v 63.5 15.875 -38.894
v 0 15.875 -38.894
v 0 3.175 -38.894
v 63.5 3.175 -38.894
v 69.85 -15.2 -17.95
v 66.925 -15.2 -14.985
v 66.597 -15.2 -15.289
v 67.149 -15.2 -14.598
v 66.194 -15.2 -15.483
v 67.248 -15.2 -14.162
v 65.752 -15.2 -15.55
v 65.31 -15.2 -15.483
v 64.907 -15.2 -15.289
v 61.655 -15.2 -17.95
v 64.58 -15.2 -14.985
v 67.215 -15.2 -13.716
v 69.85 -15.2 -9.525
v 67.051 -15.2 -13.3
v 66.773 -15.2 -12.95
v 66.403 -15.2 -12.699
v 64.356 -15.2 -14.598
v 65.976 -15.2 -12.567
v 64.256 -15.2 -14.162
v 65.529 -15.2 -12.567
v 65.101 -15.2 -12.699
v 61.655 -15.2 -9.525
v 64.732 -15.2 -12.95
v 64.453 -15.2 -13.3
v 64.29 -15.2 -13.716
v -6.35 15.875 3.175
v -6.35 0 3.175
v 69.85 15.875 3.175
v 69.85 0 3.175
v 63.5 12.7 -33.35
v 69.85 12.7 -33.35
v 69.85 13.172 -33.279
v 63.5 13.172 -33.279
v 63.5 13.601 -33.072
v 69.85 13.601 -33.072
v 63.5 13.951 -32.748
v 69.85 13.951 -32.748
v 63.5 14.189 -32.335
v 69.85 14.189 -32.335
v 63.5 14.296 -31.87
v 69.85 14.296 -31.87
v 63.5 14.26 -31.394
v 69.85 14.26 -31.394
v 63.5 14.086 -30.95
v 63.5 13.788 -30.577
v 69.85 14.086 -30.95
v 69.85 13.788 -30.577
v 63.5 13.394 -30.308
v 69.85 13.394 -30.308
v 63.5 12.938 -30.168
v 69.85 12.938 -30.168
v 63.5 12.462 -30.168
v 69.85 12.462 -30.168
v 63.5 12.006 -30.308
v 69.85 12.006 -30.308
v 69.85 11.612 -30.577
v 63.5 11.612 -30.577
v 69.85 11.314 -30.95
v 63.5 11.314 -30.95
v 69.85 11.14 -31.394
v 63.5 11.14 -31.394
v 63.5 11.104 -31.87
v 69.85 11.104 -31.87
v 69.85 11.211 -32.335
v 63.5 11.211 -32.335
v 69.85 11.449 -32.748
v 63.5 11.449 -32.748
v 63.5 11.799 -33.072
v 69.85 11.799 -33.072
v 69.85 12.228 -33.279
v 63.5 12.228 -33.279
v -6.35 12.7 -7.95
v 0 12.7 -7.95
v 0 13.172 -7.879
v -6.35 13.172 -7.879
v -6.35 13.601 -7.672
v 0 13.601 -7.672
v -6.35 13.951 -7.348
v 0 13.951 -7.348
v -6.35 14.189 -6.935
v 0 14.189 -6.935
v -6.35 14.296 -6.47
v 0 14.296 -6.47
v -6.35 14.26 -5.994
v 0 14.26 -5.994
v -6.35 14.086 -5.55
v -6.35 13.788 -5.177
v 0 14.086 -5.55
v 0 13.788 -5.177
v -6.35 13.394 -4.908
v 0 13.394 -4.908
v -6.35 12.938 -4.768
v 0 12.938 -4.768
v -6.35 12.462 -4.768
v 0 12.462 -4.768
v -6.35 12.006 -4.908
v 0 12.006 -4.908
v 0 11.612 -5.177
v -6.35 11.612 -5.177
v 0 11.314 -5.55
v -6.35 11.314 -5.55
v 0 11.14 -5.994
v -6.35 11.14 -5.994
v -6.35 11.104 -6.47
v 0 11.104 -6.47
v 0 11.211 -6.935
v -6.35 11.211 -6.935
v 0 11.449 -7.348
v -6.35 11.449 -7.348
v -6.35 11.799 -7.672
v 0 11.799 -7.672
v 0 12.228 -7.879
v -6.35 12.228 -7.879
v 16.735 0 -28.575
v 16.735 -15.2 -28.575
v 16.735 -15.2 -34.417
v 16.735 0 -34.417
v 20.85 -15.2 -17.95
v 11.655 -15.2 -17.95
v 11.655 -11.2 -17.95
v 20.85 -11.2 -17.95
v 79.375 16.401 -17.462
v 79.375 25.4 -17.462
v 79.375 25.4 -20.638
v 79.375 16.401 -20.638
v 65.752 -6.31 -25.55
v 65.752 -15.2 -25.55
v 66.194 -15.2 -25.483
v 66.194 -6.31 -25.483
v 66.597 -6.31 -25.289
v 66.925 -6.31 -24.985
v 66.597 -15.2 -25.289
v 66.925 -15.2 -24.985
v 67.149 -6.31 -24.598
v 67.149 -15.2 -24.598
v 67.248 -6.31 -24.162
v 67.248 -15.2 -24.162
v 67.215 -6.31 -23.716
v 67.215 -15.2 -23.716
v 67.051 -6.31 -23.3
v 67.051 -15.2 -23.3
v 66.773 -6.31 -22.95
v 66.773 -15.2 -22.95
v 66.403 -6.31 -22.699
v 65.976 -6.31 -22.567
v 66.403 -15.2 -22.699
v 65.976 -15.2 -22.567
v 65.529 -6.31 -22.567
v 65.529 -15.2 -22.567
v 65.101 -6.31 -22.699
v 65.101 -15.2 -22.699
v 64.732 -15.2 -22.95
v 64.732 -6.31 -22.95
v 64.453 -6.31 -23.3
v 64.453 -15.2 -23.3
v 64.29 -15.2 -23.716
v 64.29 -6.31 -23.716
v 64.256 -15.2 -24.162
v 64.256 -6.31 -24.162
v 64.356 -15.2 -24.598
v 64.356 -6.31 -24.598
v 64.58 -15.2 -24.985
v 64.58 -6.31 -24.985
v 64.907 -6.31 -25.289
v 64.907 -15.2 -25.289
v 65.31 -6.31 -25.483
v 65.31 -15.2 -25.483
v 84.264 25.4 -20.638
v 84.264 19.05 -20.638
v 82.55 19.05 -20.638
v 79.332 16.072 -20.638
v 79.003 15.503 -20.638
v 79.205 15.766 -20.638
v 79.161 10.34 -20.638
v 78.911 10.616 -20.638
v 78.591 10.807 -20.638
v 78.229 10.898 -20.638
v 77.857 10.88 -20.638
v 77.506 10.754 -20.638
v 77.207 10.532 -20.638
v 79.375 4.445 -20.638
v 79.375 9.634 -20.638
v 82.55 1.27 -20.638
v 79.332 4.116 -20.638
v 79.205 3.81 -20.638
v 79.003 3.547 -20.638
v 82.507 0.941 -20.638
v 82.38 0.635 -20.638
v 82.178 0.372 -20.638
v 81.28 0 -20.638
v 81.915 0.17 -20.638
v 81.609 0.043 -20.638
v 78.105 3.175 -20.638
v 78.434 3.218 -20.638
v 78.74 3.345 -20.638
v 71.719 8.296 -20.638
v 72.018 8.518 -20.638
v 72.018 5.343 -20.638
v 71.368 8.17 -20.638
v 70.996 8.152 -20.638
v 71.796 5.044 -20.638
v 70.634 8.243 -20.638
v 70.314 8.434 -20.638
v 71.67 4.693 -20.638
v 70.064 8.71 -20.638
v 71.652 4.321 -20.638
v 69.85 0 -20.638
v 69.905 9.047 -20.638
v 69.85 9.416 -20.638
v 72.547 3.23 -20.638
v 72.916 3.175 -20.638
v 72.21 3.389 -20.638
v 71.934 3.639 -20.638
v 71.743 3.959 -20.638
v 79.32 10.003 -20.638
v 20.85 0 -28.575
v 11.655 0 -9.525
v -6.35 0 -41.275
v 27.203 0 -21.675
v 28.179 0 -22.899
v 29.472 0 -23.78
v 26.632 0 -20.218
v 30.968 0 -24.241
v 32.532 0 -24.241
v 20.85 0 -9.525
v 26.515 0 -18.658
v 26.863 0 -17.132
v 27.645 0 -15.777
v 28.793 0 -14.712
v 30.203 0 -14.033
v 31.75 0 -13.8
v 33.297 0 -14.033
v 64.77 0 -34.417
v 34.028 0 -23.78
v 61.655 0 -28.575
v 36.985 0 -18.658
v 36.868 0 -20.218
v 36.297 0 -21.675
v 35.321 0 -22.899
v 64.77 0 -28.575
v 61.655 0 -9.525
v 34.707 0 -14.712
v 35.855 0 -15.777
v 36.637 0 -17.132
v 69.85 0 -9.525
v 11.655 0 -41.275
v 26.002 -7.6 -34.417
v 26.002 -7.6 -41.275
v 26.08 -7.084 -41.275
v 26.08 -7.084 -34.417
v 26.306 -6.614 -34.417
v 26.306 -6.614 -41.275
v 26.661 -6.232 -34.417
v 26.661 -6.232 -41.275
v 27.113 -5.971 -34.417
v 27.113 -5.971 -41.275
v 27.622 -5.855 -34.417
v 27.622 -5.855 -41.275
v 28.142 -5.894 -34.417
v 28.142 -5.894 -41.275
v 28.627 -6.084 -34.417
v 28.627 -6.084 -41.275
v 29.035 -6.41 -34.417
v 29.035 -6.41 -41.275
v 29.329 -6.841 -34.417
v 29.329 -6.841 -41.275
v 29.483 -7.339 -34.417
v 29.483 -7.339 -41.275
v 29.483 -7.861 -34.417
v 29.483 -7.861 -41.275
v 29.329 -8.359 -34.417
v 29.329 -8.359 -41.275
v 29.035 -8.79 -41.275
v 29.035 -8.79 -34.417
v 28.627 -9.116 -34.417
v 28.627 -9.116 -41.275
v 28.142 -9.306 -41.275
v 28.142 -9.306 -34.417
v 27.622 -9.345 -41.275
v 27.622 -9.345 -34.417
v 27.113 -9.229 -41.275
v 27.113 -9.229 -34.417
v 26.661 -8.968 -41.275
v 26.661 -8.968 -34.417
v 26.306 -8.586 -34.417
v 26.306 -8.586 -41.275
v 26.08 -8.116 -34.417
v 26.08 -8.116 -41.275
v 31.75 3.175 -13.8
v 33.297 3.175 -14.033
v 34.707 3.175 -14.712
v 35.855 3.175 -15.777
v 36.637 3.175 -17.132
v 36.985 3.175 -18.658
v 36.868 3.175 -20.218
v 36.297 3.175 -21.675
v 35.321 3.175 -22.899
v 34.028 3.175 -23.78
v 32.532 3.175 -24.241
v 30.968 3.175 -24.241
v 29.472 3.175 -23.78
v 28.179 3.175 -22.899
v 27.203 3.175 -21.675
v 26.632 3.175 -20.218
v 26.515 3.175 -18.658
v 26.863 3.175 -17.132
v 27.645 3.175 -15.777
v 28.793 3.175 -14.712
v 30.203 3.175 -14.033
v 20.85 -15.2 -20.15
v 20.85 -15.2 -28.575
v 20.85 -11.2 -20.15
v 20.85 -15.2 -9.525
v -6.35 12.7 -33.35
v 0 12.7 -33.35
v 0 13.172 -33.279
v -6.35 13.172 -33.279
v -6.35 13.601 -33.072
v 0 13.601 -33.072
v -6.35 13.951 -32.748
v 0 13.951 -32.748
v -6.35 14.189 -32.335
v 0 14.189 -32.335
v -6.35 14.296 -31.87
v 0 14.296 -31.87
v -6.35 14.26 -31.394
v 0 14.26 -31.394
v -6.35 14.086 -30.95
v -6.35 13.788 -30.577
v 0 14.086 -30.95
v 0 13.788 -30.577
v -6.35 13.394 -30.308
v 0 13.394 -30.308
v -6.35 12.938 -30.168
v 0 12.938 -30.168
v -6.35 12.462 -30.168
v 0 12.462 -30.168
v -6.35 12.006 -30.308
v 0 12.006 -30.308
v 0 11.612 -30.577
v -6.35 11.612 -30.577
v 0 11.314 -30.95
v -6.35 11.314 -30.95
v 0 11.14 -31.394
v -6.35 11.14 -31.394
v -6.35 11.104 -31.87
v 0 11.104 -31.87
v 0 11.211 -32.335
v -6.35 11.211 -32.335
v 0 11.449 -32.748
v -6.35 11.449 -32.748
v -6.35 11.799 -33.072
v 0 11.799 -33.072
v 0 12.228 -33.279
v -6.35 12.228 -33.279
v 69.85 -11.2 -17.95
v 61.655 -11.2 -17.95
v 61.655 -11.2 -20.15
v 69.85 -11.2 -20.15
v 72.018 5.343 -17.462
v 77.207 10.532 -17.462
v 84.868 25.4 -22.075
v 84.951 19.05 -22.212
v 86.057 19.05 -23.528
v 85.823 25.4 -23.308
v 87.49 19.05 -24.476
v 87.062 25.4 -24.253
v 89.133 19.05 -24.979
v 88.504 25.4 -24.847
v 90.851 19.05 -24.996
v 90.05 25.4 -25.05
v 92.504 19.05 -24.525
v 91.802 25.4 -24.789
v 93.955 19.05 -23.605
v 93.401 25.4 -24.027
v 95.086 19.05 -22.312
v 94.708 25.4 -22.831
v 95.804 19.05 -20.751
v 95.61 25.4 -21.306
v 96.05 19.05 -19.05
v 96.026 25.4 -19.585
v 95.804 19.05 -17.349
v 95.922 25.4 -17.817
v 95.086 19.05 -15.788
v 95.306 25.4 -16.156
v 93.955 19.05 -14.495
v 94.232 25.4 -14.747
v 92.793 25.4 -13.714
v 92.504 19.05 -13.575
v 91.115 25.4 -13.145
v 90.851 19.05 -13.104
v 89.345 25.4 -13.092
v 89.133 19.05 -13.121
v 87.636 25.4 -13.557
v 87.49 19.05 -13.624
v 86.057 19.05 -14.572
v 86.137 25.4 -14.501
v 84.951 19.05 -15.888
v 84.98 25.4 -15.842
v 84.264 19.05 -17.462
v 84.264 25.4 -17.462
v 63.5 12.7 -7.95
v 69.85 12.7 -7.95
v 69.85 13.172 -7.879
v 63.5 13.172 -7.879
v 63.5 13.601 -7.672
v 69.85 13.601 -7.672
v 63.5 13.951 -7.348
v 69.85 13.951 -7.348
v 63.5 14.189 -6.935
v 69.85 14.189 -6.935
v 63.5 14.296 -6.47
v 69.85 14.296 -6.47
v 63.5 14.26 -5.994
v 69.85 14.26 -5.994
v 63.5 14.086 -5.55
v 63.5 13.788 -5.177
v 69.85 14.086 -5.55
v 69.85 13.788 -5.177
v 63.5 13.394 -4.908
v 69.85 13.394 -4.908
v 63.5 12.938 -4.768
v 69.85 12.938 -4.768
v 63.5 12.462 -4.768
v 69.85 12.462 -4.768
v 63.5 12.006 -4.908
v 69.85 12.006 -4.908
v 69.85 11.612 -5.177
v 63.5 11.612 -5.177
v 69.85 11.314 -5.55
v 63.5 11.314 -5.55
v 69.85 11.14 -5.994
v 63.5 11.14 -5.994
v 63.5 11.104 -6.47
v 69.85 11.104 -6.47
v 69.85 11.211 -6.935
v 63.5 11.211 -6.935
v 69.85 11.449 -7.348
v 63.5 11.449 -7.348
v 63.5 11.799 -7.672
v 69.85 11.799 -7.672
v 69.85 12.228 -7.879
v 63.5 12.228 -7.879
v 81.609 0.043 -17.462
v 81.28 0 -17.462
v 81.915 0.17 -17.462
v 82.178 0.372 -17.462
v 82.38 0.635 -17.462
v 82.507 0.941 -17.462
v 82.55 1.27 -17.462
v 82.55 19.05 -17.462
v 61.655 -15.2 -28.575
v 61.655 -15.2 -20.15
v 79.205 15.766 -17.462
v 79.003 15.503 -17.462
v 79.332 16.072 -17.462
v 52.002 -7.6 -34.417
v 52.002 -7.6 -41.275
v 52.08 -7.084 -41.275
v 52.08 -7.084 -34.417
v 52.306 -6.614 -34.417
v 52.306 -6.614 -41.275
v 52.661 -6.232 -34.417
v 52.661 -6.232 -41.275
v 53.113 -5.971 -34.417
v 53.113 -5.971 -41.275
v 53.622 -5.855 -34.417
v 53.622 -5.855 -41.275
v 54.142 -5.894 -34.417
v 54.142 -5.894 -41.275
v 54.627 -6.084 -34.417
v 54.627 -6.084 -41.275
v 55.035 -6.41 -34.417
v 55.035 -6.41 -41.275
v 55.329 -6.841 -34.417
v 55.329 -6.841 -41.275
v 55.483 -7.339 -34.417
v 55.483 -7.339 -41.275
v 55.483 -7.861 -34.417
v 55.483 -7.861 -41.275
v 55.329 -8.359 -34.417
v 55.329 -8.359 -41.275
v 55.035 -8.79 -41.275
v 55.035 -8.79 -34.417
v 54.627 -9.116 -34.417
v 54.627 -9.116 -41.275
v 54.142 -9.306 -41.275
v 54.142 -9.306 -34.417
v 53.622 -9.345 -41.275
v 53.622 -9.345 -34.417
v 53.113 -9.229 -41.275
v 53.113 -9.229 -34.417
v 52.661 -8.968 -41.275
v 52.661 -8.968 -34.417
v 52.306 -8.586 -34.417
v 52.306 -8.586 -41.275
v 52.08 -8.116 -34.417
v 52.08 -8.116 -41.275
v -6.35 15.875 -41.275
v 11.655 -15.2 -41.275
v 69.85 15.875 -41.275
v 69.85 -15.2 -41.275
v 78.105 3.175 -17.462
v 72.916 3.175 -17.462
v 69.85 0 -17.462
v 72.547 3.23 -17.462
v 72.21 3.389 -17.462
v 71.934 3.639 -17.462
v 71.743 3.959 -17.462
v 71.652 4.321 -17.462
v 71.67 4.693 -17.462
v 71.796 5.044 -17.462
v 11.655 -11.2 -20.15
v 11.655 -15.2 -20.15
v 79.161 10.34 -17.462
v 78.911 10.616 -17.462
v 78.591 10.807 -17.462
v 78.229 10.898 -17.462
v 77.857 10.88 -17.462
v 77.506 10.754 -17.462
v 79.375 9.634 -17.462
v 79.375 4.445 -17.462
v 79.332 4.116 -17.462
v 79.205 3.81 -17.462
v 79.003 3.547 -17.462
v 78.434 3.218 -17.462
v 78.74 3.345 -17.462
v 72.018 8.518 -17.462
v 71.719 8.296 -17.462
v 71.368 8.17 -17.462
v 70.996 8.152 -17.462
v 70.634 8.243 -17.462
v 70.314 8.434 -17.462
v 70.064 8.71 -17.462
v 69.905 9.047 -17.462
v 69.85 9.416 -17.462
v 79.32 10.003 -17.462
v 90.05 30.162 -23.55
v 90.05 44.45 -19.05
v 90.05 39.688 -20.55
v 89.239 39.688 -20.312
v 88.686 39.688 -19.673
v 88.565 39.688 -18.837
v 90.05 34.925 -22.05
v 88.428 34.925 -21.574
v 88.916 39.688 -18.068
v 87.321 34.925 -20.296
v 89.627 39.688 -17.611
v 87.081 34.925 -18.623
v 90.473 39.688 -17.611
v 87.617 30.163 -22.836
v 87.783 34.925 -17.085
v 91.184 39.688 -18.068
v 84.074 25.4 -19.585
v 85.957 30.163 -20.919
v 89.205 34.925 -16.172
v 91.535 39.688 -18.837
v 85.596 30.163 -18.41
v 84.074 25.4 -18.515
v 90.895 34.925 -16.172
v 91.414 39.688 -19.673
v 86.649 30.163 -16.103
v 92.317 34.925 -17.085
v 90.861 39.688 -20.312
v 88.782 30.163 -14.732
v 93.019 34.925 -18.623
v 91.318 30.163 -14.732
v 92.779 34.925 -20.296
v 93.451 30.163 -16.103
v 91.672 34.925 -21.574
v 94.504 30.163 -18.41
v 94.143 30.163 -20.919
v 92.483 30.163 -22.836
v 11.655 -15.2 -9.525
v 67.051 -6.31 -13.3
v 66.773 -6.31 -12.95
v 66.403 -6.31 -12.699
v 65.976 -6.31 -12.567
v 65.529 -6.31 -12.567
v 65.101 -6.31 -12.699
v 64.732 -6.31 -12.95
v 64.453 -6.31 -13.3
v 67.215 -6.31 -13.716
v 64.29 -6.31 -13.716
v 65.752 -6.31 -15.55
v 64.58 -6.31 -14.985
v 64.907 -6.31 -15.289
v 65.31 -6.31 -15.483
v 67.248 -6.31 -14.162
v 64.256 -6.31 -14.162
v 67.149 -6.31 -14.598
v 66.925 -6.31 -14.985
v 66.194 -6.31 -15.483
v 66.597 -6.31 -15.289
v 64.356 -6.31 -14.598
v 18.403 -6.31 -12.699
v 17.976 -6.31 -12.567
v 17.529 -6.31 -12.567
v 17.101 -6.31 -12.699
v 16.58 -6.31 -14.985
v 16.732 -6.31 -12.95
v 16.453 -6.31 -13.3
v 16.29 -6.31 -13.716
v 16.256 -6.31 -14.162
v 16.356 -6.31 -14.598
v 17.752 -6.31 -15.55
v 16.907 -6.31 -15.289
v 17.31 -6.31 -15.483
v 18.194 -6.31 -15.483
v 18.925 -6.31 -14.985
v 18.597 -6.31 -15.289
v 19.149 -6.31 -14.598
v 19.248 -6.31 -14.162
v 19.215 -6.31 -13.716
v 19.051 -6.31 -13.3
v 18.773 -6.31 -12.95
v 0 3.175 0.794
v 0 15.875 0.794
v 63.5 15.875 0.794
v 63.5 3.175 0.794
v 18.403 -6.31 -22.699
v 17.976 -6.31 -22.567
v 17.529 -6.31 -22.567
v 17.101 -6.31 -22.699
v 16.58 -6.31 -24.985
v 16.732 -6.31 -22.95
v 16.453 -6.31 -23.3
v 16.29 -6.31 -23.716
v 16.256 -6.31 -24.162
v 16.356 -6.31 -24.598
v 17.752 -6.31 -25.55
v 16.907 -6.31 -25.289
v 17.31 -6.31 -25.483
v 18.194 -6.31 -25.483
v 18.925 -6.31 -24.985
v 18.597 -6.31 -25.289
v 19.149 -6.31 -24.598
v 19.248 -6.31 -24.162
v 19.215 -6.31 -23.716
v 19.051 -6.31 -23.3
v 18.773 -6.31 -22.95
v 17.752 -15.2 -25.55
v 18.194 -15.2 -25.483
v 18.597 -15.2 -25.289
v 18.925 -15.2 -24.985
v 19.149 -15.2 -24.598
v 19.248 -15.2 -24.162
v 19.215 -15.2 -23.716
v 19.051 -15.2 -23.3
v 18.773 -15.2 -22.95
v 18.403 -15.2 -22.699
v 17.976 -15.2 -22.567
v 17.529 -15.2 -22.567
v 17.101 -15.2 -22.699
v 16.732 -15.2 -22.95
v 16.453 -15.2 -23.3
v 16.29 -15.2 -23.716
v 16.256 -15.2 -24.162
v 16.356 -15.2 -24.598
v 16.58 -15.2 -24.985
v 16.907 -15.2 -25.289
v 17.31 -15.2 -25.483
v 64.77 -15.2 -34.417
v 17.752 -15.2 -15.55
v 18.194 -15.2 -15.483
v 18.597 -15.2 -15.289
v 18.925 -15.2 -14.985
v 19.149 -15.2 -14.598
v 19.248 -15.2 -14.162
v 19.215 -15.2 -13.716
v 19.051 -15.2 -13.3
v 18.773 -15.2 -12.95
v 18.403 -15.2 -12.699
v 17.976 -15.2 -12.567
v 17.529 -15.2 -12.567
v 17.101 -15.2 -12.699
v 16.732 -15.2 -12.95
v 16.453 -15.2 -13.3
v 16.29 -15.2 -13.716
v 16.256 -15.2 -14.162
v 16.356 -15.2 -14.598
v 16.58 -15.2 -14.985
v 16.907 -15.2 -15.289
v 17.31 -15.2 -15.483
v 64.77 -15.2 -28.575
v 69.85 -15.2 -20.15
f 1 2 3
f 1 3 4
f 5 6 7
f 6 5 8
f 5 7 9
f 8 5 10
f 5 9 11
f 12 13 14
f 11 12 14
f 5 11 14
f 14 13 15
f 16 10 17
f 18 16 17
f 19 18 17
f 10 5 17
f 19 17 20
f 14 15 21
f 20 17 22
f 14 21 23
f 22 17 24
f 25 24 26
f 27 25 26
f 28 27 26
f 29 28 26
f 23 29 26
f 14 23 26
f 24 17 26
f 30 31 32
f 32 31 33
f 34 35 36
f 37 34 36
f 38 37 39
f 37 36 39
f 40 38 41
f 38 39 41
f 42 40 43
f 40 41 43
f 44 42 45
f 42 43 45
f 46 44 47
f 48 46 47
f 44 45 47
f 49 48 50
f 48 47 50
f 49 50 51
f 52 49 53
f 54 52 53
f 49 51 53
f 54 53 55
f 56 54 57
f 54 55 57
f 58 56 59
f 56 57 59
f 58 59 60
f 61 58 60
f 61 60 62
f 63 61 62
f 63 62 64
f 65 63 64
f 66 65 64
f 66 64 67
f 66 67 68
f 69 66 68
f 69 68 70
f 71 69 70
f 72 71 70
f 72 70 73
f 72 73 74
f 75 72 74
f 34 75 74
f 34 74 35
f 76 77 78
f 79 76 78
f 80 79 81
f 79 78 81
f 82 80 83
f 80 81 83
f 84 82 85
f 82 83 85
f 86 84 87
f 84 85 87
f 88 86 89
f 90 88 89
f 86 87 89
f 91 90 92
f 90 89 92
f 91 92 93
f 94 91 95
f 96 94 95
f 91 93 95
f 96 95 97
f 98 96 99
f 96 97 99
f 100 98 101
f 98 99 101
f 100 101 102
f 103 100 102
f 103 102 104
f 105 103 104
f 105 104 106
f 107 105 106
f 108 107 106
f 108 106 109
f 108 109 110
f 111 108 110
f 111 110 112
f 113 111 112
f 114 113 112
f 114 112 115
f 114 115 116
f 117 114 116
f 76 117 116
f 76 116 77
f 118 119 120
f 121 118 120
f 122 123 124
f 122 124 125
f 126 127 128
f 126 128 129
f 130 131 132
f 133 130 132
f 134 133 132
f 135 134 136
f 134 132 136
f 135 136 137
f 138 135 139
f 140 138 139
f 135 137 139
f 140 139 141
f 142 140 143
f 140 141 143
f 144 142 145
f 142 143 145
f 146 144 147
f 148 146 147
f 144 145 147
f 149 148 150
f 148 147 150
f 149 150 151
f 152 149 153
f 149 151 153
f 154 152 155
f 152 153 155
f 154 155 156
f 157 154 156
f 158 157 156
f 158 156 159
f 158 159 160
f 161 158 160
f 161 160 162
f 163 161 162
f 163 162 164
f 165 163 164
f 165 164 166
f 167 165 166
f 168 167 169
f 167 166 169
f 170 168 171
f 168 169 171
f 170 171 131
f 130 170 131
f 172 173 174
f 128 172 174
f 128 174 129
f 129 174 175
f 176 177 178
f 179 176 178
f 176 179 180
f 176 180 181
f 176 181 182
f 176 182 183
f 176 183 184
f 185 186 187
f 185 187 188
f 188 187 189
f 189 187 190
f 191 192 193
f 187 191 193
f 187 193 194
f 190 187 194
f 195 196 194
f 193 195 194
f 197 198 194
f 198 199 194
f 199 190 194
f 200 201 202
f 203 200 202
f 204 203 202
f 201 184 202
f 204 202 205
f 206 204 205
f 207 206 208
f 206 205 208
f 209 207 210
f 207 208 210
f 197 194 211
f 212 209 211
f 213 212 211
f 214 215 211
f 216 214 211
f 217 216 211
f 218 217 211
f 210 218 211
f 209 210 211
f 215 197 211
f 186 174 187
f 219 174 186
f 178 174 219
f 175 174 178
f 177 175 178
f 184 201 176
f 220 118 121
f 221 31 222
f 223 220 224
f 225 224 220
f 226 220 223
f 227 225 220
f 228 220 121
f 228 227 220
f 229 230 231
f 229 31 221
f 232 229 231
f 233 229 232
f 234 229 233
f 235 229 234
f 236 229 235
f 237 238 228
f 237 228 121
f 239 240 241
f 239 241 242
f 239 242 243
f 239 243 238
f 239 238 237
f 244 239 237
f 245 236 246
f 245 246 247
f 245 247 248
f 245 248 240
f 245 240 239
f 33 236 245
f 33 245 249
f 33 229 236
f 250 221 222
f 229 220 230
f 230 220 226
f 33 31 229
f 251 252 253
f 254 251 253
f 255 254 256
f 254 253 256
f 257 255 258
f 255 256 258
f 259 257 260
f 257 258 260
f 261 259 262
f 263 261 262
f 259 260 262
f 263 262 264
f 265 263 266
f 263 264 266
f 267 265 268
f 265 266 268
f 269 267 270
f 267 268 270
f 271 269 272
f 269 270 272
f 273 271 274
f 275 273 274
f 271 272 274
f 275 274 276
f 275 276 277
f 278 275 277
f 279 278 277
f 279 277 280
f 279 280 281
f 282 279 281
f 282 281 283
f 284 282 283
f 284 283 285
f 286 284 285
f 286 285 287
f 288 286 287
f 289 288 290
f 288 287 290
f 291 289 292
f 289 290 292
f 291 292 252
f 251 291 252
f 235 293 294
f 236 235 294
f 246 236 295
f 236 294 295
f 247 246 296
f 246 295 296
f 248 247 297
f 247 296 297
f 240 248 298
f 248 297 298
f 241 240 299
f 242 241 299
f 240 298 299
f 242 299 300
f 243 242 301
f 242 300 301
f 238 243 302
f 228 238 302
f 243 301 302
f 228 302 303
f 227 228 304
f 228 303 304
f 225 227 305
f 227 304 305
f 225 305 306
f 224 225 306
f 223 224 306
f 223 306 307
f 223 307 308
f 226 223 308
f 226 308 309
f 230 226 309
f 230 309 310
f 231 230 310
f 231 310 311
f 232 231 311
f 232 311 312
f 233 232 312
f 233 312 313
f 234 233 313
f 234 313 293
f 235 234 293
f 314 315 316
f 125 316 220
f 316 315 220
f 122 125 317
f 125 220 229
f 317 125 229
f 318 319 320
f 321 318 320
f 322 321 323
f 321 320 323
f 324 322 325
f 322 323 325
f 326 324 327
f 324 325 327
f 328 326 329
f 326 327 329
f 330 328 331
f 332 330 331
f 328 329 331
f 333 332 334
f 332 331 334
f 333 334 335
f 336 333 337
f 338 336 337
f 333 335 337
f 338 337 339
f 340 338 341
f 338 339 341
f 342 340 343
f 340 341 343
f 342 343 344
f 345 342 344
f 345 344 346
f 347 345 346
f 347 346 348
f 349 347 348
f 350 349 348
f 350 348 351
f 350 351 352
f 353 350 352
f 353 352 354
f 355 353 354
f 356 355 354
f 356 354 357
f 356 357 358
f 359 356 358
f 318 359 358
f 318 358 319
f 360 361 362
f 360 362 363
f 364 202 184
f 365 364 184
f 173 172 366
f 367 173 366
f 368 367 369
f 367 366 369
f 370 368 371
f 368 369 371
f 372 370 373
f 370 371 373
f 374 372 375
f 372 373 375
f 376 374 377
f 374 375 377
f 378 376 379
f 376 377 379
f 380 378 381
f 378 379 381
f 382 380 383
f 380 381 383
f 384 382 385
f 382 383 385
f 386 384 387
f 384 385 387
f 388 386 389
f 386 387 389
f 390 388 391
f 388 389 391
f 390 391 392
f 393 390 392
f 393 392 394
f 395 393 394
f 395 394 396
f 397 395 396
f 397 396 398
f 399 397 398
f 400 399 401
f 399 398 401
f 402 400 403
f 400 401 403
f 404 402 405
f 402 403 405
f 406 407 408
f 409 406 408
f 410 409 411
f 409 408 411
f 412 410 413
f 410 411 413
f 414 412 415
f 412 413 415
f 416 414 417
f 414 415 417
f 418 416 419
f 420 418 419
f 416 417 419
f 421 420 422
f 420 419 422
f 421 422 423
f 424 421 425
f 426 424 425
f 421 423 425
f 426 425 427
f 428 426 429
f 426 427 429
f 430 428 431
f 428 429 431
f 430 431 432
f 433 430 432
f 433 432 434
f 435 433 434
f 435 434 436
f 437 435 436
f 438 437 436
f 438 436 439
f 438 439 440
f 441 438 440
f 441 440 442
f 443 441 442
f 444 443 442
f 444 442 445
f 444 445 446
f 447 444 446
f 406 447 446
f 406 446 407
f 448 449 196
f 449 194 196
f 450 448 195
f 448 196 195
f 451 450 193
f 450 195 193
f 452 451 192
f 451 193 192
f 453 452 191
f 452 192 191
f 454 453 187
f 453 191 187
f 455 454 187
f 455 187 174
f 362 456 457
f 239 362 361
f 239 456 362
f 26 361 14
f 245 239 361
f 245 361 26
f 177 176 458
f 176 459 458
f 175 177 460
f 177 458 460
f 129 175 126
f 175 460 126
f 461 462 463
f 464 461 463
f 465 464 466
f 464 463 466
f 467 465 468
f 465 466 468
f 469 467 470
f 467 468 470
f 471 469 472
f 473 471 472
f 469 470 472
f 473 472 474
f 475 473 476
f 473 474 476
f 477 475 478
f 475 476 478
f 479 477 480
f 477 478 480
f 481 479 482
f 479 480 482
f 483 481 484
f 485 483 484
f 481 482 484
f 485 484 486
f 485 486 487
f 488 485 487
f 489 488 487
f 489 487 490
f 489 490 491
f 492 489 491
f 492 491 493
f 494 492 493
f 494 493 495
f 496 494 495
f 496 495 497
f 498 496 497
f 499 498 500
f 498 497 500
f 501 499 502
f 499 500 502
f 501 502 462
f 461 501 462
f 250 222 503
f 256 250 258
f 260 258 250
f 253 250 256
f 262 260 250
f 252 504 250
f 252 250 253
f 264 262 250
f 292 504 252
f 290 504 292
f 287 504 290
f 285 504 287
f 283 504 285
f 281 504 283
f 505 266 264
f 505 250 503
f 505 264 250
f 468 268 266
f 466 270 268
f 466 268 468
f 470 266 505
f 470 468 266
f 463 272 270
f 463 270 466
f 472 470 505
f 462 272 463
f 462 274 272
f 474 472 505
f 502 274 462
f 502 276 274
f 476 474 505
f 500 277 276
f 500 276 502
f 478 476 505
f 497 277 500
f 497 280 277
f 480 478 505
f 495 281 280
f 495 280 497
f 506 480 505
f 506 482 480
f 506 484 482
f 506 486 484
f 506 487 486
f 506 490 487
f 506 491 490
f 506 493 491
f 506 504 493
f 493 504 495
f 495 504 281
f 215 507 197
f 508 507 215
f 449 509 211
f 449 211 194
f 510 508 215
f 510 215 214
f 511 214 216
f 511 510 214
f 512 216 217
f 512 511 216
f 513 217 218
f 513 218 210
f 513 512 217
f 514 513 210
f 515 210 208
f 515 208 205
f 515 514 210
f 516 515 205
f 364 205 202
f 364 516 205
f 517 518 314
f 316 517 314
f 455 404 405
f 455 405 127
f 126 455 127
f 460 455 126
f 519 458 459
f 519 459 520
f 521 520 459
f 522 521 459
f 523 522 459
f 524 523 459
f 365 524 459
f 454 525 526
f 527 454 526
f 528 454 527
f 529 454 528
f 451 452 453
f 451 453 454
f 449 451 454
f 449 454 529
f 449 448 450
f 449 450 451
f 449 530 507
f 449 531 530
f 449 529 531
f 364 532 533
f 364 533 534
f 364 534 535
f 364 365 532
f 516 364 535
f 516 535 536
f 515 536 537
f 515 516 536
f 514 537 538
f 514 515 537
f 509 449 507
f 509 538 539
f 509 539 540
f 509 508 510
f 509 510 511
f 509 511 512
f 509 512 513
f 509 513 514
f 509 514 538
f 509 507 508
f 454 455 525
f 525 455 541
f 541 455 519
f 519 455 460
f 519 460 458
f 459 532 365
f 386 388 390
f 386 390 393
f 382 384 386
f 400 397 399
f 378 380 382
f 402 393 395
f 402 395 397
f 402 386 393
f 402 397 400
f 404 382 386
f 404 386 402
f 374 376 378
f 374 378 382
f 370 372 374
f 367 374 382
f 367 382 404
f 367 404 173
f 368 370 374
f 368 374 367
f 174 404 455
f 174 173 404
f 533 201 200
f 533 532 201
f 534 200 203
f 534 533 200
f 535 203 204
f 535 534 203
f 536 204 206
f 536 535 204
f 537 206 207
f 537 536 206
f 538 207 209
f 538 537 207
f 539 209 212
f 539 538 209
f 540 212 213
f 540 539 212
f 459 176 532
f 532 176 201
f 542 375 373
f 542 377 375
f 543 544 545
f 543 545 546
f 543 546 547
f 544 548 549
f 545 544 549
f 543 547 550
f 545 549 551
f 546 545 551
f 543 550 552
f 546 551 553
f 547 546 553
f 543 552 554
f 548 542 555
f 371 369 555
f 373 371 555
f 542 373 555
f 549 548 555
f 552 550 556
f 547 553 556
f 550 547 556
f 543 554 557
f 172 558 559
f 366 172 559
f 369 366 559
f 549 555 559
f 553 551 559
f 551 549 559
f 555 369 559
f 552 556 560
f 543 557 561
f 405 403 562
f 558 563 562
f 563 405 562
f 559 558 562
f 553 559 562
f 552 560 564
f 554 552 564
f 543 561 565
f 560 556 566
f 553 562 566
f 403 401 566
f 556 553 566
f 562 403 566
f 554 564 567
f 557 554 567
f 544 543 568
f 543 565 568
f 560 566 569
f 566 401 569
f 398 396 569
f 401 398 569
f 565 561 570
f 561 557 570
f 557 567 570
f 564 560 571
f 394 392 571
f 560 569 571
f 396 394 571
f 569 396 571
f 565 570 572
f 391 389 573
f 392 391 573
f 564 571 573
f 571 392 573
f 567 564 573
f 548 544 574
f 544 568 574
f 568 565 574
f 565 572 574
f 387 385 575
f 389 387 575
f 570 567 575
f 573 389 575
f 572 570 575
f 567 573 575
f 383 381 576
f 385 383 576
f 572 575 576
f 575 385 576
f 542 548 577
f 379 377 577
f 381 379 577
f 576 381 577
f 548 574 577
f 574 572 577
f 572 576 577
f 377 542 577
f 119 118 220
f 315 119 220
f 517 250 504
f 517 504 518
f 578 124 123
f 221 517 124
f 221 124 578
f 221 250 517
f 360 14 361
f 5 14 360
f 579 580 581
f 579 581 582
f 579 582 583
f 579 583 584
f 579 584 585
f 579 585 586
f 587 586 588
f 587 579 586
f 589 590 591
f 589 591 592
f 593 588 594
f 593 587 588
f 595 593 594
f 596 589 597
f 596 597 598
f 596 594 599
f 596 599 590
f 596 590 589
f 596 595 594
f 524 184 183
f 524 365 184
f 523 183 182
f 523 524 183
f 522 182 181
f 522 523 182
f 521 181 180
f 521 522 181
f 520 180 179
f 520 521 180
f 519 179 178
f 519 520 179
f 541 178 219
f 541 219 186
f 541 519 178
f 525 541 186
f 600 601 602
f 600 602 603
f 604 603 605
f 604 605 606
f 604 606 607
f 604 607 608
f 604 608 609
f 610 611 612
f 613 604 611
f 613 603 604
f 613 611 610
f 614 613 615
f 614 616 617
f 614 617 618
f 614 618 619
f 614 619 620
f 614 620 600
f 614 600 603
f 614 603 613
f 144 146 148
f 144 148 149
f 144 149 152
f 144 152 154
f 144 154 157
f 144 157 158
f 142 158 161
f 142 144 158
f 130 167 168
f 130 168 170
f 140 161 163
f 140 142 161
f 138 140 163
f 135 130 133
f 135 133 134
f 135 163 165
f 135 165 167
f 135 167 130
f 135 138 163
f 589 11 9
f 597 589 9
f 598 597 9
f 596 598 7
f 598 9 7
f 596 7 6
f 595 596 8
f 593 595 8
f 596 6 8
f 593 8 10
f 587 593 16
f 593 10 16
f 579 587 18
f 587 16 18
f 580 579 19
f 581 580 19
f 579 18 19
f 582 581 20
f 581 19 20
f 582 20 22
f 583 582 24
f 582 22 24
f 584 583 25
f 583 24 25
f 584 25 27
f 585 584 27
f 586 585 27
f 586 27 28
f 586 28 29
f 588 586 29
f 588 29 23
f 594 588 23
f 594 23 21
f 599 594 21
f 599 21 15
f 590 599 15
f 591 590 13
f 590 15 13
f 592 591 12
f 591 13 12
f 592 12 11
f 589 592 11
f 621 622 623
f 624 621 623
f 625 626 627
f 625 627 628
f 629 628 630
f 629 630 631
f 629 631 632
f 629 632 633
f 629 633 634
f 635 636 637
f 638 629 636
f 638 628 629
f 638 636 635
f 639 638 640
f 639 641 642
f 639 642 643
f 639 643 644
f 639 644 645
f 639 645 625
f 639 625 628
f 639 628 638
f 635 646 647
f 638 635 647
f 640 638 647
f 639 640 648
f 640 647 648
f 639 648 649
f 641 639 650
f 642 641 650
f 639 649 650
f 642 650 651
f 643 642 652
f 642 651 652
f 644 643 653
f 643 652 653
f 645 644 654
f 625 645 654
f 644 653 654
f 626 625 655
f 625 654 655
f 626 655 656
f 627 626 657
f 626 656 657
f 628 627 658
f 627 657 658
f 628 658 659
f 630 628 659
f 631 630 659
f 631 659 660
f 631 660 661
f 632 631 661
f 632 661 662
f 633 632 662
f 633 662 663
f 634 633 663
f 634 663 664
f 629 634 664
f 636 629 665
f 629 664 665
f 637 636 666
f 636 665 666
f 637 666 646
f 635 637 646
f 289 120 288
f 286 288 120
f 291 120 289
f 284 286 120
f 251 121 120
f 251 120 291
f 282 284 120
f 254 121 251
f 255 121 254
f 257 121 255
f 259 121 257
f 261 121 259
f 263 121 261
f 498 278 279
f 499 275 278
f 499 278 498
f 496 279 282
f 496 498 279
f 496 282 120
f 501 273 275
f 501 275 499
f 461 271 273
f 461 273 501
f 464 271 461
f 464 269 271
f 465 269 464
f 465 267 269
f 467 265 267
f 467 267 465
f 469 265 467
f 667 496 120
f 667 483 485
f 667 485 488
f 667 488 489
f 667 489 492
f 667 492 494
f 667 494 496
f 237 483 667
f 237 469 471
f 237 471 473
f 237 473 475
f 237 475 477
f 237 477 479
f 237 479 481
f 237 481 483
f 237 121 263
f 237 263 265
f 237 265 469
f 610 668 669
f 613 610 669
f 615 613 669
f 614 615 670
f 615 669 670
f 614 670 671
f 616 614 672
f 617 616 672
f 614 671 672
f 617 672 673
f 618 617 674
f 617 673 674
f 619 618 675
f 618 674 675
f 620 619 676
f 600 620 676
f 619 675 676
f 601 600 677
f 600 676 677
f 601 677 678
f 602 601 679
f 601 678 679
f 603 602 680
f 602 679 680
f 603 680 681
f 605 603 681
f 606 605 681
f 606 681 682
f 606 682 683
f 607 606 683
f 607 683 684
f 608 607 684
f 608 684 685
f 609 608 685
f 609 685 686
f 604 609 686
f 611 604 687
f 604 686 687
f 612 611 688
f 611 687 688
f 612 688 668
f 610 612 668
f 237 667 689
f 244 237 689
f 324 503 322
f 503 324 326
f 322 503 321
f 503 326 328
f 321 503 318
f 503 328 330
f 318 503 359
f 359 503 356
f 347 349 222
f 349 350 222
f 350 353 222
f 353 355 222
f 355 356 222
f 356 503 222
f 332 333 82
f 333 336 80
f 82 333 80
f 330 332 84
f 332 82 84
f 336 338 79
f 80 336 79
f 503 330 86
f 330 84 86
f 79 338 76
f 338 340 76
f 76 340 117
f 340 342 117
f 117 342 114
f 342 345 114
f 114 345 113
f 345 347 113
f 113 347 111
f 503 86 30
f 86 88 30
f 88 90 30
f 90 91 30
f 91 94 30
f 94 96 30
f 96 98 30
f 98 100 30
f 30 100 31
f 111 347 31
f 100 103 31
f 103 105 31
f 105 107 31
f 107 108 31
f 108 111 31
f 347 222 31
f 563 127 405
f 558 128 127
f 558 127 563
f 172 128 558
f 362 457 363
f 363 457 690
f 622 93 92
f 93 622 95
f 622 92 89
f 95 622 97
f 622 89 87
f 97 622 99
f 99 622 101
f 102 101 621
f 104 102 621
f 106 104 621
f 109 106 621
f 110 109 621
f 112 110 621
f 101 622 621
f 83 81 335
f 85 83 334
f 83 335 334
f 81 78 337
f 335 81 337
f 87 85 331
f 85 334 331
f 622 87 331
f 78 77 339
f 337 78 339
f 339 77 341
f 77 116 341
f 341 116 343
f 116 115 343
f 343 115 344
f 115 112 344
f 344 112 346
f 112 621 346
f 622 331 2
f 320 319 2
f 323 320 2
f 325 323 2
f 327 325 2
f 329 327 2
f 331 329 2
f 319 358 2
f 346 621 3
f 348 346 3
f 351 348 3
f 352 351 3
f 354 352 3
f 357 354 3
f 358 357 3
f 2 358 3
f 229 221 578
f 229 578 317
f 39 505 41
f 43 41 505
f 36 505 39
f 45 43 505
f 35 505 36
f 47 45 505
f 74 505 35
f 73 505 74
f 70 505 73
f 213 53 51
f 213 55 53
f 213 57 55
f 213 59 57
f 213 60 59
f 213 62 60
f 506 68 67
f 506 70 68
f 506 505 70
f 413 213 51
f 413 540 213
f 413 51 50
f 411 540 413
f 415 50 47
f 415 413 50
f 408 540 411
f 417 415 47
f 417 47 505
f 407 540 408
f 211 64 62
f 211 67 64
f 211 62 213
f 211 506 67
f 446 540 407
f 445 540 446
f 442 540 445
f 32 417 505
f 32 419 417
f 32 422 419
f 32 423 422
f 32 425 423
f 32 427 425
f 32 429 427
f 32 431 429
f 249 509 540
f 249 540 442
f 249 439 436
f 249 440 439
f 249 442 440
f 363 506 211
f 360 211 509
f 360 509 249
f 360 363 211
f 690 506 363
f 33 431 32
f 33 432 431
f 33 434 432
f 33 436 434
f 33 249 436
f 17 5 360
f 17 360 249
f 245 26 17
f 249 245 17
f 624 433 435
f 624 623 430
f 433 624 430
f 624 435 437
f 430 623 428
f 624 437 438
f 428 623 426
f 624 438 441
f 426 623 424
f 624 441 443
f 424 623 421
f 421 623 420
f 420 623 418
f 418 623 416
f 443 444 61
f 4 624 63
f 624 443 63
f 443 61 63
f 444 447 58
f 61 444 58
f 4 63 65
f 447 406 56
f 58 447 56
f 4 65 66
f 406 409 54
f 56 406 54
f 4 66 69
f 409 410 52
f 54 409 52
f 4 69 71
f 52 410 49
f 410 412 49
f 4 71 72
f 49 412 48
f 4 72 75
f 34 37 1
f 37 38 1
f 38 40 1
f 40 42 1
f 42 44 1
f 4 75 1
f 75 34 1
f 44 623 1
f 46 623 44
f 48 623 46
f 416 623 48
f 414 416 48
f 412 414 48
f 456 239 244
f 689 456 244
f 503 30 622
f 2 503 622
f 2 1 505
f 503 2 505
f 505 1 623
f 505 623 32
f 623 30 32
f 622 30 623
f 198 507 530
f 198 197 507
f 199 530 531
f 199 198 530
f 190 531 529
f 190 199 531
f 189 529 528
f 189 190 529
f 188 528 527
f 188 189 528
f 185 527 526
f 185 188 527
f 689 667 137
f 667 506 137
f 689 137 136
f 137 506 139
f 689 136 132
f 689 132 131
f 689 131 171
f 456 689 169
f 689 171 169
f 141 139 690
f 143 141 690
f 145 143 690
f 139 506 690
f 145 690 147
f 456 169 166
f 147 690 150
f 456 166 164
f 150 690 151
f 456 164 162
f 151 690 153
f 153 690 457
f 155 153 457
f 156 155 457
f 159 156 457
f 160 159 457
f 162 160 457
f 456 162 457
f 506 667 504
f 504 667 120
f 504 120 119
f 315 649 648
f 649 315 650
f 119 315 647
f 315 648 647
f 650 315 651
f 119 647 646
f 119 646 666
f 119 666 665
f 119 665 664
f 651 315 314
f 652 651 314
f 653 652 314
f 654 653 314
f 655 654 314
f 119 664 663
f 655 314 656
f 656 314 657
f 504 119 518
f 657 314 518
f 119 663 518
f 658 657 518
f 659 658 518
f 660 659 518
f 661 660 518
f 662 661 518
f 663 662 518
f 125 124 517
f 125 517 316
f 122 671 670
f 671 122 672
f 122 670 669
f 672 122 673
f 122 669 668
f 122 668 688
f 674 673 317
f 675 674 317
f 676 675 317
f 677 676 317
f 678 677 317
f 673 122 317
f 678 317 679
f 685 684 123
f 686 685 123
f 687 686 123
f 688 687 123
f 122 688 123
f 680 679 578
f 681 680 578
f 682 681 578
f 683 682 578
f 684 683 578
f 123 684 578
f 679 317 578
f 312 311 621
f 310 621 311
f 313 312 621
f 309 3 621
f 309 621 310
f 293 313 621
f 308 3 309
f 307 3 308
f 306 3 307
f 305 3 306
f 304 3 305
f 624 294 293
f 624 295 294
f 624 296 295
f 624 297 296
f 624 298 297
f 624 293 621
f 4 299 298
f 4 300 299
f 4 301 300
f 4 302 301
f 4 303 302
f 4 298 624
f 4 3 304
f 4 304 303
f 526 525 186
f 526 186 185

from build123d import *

# Parameters (mm, degrees)
SKETCH1_W                = 63.5
SKETCH1_H                = 38.1
BASE_DEPTH               = 3.175
SKETCH3_W                = 6.35
SKETCH3_H                = 38.1
ROD_HOLDER_DEPTH         = 15.875
SKETCH4_R                = 1.6
ROD_HOLE_DEPTH           = 87.660634806
SKETCH7_R                = 5.25
GEARPINHOLE_10_5MM_DEPTH = 81.572467382
SKETCH9_W                = 76.2
SKETCH9_H                = 3.175
BOSS_EXTRUDE1_DEPTH      = 15.875
SKETCH11_W               = 8.195400186
SKETCH11_H               = 19.05
BOSS_EXTRUDE2_DEPTH      = 15.2
SKETCH20_W               = 1
SKETCH20_H               = 19.05
BOSS_EXTRUDE7_DEPTH      = 15.2
SKETCH12_R               = 1.5
CUT_EXTRUDE1_DEPTH       = 8.89
BOSS_EXTRUDE3_DEPTH      = 15.2
SKETCH14_R               = 1.75
CUT_EXTRUDE2_DEPTH       = 6.858
SKETCH15_W               = 63.5
SKETCH15_H               = 0.79375
CUT_EXTRUDE3_DEPTH       = 12.7
SKETCH16_W               = 9.195400186
SKETCH16_H               = 2.2
SKETCH16_W_2             = 8.195400186
CUT_EXTRUDE4_DEPTH       = 4
BOSS_EXTRUDE4_DEPTH      = 1.5875
BOSS_EXTRUDE4_DEPTH_BACK = 1.5875
BOSS_EXTRUDE4_START      = -22.225
SKETCH18_R               = 5
BOSS_EXTRUDE5_DEPTH      = 6.35
BOSS_EXTRUDE6_DEPTH      = 3.175
FILLET1_R                = 1.27
FILLET2_R                = 1.27
SKETCH21_R               = 5
BOSS_EXTRUDE8_DEPTH      = 6.35


with BuildPart() as part:
    # Sketch1 → Base (new body)
    with BuildSketch(Plane(origin=(0, 0, 0), x_dir=(1, 0, 0), z_dir=(0, 1, 0))):
        with Locations((31.75, 19.05)):
            Rectangle(SKETCH1_W, SKETCH1_H)
    extrude(amount=BASE_DEPTH)

    # Sketch3 → Rod Holder (add)
    with BuildSketch(Plane(origin=(0, 0, 0), x_dir=(1, 0, 0), z_dir=(0, 1, 0))):
        with Locations((-3.175, 19.05)):
            Rectangle(SKETCH3_W, SKETCH3_H)
        with Locations((66.675, 19.05)):
            Rectangle(SKETCH3_W, SKETCH3_H)
    extrude(amount=ROD_HOLDER_DEPTH)

    # Sketch4 → Rod Hole (cut, through all)
    with BuildSketch(Plane(origin=(69.85, 0, 0), x_dir=(0, 0, -1), z_dir=(1, 0, 0))):
        with Locations((6.35, 12.7)):
            Circle(SKETCH4_R)
        with Locations((31.75, 12.7)):
            Circle(SKETCH4_R)
    extrude(amount=-ROD_HOLE_DEPTH, mode=Mode.SUBTRACT)

    # Sketch7 → GearPinHole_10.5mm (cut, through all)
    with BuildSketch(Plane(origin=(0, 3.175, 0), x_dir=(1, 0, 0), z_dir=(0, 1, 0))):
        with Locations(Location((31.75, 19.05, 0), (0, 0, 270))):
            Circle(SKETCH7_R)
    extrude(amount=-GEARPINHOLE_10_5MM_DEPTH, mode=Mode.SUBTRACT)

    # Sketch9 → Boss-Extrude1 (add)
    with BuildSketch(Plane.XZ):
        with Locations((31.75, 1.5875)):
            Rectangle(SKETCH9_W, SKETCH9_H)
        with Locations((31.75, -39.6875)):
            Rectangle(SKETCH9_W, SKETCH9_H)
    extrude(amount=-BOSS_EXTRUDE1_DEPTH)

    # Sketch11 → Boss-Extrude2 (add)
    with BuildSketch(Plane.XZ):
        with Locations((15.752300005, -19.05)):
            Rectangle(SKETCH11_W, SKETCH11_H)
        with Locations((65.752299907, -19.05)):
            Rectangle(SKETCH11_W, SKETCH11_H)
    extrude(amount=BOSS_EXTRUDE2_DEPTH)

    # Sketch20 → Boss-Extrude7 (add)
    with BuildSketch(Plane.XZ):
        with Locations((20.350000098, -19.05)):
            Rectangle(SKETCH20_W, SKETCH20_H)
    extrude(amount=BOSS_EXTRUDE7_DEPTH)

    # Sketch12 → Cut-Extrude1 (cut)
    with BuildSketch(Plane.XZ.offset(15.2)):
        with Locations(Location((17.75230014, -14.05, 0), (0, 0, 270))):
            Circle(SKETCH12_R)
        with Locations(Location((17.75230014, -24.05, 0), (0, 0, 270))):
            Circle(SKETCH12_R)
        with Locations(Location((65.752299962, -24.05, 0), (0, 0, 270))):
            Circle(SKETCH12_R)
        with Locations(Location((65.752299962, -14.05, 0), (0, 0, 270))):
            Circle(SKETCH12_R)
    extrude(amount=-CUT_EXTRUDE1_DEPTH, mode=Mode.SUBTRACT)

    # Sketch13 → Boss-Extrude3 (add)
    with BuildSketch(Plane.XZ):
        Polygon((11.654599912, -28.575), (16.734599912, -28.575), (16.734599912, -34.417), (64.77, -34.417), (64.77, -28.575), (69.85, -28.575), (69.85, -41.275), (11.654599912, -41.275), align=None)
    extrude(amount=BOSS_EXTRUDE3_DEPTH)

    # Sketch14 → Cut-Extrude2 (cut)
    with BuildSketch(Plane(origin=(0, 0, -41.275), x_dir=(-1, 0, 0), z_dir=(0, 0, -1))):
        with Locations((-53.752299956, -7.6)):
            Circle(SKETCH14_R)
        with Locations((-27.752299956, -7.6)):
            Circle(SKETCH14_R)
    extrude(amount=-CUT_EXTRUDE2_DEPTH, mode=Mode.SUBTRACT)

    # Sketch15 → Cut-Extrude3 (cut)
    with BuildSketch(Plane(origin=(0, 15.875, 0), x_dir=(1, 0, 0), z_dir=(0, 1, 0))):
        with Locations((31.75, 38.496875)):
            Rectangle(SKETCH15_W, SKETCH15_H)
        with Locations((31.75, -0.396875)):
            Rectangle(SKETCH15_W, SKETCH15_H)
    extrude(amount=-CUT_EXTRUDE3_DEPTH, mode=Mode.SUBTRACT)

    # Sketch16 → Cut-Extrude4 (cut)
    with BuildSketch(Plane.XZ.offset(15.2)):
        with Locations((16.252300005, -19.05)):
            Rectangle(SKETCH16_W, SKETCH16_H)
        with Locations((65.752299907, -19.05)):
            Rectangle(SKETCH16_W_2, SKETCH16_H)
    extrude(amount=-CUT_EXTRUDE4_DEPTH, mode=Mode.SUBTRACT)

    # Sketch17 → Boss-Extrude4 (add, two sides: drawn at the far end of the back side and taken through both)
    with BuildSketch(Plane(origin=(0, 0, -41.275), x_dir=(-1, 0, 0), z_dir=(0, 0, -1)).offset(BOSS_EXTRUDE4_START - BOSS_EXTRUDE4_DEPTH_BACK)):
        Polygon((-69.85, 0), (-82.55, 0), (-82.55, 25.4), (-79.375, 25.4), (-79.375, 3.175), (-69.85, 3.175), align=None)
    extrude(amount=BOSS_EXTRUDE4_DEPTH + BOSS_EXTRUDE4_DEPTH_BACK)

    # Sketch18 → Boss-Extrude5 (add)
    with BuildSketch(Plane(origin=(0, 25.4, 0), x_dir=(1, 0, 0), z_dir=(0, 1, 0))):
        with BuildLine():
            Line((82.55, 20.6375), (84.263823045, 20.6375))
            ThreePointArc((84.263823045, 20.6375), (96.05, 19.05), (84.263823045, 17.4625))
            Line((84.263823045, 17.4625), (82.55, 17.4625))
            Line((82.55, 17.4625), (82.55, 20.6375))
        make_face()
        with Locations(Location((90.05, 19.05, 0), (0, 0, 180))):
            Circle(SKETCH18_R, mode=Mode.SUBTRACT)
    extrude(amount=-BOSS_EXTRUDE5_DEPTH)

    # Sketch19 → Boss-Extrude6 (add)
    with BuildSketch(Plane(origin=(0, 0, -20.6375), x_dir=(-1, 0, 0), z_dir=(0, 0, -1))):
        Polygon((-79.375, 15.875), (-69.85, 6.35), (-69.85, 3.175), (-79.375, 12.7), align=None)
    extrude(amount=-BOSS_EXTRUDE6_DEPTH)

    # Fillet1
    fillet1_edges = [part.edges().sort_by_distance(p)[0] for p in [
        (82.55, 0, -19.05),
        (79.375, 3.175, -19.05),
        (79.375, 12.7, -19.05),
        (79.375, 15.875, -19.05),
        (69.85, 6.35, -19.05),
    ]]
    fillet(fillet1_edges, radius=FILLET1_R)

    # Fillet2
    # the kernel refuses this fillet: 1.27 mm, written as the material it adds along each edge
    with BuildSketch(Plane(origin=(69.85, 3.175, -17.4625), x_dir=(1, 0, 0), z_dir=(0, 0, -1))) as fillet2_piece_1:
        with BuildLine():
            CenterArc((FILLET2_R * 2.41421356237, -FILLET2_R), FILLET2_R, 90, 135)
            Line((FILLET2_R * 1.70710678119, -FILLET2_R * 1.70710678119), (0, 0))
            Line((0, 0), (FILLET2_R * 2.41421356237, 0))
        make_face()
    extrude(amount=3.175)

    # Sketch21 → Boss-Extrude8 (add)
    with BuildSketch(Plane(origin=(0, 25.4, 0), x_dir=(1, 0, 0), z_dir=(0, 1, 0))):
        with Locations((90.05, 19.05)):
            Circle(SKETCH21_R)
    extrude(amount=-BOSS_EXTRUDE8_DEPTH)

    # Sketch22 → Revolve1 (revolve)
    with BuildSketch(Plane.XY.offset(-19.05), mode=Mode.PRIVATE) as revolve1_sk:
        Polygon((90.05, 25.4), (90.05, 44.45), (96.05, 25.4), align=None)
    revolve(revolve1_sk.sketch.rotate(Axis((90.05, 25.4, -19.05), (0, 1, 0)), 90), axis=Axis((90.05, 25.4, -19.05), (0, 1, 0)))


solid = part.part
